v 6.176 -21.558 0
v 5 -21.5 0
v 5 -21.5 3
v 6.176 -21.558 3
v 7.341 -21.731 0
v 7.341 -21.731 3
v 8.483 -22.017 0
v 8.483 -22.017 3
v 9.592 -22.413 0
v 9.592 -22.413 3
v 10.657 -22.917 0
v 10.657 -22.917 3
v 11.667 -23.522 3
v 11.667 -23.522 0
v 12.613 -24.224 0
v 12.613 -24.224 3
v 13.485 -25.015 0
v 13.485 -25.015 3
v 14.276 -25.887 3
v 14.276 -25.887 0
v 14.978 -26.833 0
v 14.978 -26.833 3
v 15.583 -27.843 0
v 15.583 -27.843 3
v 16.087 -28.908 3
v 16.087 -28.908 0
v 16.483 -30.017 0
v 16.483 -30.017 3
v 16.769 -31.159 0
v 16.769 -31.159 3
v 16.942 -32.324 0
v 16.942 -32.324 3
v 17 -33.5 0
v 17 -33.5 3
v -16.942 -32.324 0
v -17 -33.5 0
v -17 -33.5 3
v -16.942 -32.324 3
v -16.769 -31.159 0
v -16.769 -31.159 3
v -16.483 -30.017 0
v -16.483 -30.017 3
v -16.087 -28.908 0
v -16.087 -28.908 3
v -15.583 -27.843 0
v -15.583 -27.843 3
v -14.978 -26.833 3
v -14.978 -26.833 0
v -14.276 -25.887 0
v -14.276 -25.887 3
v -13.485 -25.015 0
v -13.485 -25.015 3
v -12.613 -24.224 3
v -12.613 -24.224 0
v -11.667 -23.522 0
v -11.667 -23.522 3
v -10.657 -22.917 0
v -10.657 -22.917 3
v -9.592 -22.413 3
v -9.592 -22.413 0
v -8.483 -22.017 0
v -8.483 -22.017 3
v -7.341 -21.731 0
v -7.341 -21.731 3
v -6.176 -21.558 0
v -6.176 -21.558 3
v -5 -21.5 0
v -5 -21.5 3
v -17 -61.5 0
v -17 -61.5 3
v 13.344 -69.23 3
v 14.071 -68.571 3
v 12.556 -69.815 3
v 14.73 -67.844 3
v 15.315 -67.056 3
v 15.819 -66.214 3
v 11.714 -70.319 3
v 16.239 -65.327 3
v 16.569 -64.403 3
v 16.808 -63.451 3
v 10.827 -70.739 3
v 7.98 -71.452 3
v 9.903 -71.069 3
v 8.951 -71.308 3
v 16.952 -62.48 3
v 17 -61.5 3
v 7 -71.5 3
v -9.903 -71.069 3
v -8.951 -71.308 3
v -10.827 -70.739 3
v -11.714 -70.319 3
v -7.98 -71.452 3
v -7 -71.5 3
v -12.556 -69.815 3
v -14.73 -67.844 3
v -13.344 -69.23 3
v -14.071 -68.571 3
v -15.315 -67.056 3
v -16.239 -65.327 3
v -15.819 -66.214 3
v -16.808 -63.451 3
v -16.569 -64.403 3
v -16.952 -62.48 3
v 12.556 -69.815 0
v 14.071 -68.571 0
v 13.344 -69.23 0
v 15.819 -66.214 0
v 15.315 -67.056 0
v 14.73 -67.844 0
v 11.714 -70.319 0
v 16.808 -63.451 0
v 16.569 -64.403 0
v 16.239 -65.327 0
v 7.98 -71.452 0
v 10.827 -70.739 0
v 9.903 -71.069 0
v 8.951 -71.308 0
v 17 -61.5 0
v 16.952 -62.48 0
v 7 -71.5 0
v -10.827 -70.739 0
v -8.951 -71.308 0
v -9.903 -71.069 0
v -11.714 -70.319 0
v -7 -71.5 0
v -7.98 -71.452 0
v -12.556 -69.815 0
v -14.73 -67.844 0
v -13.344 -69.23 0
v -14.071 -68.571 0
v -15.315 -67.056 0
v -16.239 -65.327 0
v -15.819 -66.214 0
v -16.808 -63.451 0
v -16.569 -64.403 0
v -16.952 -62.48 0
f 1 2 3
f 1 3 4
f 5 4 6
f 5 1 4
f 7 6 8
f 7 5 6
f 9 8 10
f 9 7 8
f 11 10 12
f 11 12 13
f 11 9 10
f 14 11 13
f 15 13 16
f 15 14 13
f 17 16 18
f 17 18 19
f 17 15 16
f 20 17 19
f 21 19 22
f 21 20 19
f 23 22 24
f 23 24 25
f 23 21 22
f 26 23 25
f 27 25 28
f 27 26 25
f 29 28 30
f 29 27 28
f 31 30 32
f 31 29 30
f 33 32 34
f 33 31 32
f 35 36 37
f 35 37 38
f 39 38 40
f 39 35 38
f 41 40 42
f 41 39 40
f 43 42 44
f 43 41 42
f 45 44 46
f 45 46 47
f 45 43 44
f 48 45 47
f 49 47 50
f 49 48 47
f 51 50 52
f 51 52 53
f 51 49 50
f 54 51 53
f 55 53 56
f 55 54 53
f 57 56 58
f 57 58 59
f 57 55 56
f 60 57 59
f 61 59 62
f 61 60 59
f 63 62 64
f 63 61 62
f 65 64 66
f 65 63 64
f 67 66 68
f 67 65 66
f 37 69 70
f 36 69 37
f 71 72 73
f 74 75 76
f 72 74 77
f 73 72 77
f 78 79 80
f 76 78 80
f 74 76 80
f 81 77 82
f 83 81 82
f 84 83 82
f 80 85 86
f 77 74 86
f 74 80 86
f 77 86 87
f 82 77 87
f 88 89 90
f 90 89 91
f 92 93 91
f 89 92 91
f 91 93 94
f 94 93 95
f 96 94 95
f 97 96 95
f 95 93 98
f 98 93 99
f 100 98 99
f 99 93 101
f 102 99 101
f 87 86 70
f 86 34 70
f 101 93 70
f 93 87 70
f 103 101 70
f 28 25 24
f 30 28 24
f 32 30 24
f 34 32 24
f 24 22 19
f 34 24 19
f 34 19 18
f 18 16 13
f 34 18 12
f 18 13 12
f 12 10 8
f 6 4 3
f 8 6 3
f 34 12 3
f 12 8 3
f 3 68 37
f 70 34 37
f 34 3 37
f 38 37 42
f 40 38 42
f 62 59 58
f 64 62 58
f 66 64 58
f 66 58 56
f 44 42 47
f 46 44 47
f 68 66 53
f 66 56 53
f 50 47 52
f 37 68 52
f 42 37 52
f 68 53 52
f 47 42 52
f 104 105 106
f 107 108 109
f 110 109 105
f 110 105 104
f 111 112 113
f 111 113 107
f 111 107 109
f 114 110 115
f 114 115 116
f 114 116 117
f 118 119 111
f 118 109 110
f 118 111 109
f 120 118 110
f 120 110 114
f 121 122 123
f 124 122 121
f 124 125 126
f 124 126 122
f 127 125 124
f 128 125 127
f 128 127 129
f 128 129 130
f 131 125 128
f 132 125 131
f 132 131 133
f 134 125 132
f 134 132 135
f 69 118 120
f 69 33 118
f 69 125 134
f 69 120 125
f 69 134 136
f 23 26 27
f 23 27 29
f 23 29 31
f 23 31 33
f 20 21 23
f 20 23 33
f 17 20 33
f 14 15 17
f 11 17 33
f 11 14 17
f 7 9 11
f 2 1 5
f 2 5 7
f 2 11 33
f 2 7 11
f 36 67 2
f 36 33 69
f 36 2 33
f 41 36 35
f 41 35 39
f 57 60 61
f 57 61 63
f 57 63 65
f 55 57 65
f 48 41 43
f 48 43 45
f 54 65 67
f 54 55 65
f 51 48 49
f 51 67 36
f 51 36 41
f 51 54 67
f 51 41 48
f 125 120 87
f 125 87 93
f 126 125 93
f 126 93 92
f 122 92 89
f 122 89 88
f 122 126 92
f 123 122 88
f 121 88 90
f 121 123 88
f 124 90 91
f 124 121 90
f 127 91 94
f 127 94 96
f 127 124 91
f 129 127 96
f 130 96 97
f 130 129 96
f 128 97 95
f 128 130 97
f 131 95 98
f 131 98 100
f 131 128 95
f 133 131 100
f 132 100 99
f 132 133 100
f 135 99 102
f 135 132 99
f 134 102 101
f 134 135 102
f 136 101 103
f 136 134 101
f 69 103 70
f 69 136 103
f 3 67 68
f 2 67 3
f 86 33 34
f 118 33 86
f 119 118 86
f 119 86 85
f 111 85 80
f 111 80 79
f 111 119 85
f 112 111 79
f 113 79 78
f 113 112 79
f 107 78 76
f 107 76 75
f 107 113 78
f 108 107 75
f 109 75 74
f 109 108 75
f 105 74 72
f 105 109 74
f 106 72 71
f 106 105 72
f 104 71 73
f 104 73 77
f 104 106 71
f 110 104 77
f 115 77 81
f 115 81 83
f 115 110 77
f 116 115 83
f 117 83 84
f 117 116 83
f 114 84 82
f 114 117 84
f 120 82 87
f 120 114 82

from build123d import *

# Parameters (mm, degrees)
BOSS_EXTRUDE1_DEPTH = 3


with BuildPart() as part:
    # Sketch1 → Boss-Extrude1 (new body)
    with BuildSketch(Plane.XY):
        with BuildLine():
            Line((-5, -21.5), (5, -21.5))
            ThreePointArc((5, -21.5), (13.485281374, -25.014718626), (17, -33.5))
            Line((17, -33.5), (17, -61.5))
            ThreePointArc((17, -61.5), (14.071067812, -68.571067812), (7, -71.5))
            Line((7, -71.5), (0.5, -71.5))
            Line((0.5, -71.5), (-0.5, -71.5))
            Line((-0.5, -71.5), (-7, -71.5))
            ThreePointArc((-7, -71.5), (-14.071067812, -68.571067812), (-17, -61.5))
            Line((-17, -61.5), (-17, -33.5))
            ThreePointArc((-17, -33.5), (-13.485281374, -25.014718626), (-5, -21.5))
        make_face()
    extrude(amount=BOSS_EXTRUDE1_DEPTH)


solid = part.part
